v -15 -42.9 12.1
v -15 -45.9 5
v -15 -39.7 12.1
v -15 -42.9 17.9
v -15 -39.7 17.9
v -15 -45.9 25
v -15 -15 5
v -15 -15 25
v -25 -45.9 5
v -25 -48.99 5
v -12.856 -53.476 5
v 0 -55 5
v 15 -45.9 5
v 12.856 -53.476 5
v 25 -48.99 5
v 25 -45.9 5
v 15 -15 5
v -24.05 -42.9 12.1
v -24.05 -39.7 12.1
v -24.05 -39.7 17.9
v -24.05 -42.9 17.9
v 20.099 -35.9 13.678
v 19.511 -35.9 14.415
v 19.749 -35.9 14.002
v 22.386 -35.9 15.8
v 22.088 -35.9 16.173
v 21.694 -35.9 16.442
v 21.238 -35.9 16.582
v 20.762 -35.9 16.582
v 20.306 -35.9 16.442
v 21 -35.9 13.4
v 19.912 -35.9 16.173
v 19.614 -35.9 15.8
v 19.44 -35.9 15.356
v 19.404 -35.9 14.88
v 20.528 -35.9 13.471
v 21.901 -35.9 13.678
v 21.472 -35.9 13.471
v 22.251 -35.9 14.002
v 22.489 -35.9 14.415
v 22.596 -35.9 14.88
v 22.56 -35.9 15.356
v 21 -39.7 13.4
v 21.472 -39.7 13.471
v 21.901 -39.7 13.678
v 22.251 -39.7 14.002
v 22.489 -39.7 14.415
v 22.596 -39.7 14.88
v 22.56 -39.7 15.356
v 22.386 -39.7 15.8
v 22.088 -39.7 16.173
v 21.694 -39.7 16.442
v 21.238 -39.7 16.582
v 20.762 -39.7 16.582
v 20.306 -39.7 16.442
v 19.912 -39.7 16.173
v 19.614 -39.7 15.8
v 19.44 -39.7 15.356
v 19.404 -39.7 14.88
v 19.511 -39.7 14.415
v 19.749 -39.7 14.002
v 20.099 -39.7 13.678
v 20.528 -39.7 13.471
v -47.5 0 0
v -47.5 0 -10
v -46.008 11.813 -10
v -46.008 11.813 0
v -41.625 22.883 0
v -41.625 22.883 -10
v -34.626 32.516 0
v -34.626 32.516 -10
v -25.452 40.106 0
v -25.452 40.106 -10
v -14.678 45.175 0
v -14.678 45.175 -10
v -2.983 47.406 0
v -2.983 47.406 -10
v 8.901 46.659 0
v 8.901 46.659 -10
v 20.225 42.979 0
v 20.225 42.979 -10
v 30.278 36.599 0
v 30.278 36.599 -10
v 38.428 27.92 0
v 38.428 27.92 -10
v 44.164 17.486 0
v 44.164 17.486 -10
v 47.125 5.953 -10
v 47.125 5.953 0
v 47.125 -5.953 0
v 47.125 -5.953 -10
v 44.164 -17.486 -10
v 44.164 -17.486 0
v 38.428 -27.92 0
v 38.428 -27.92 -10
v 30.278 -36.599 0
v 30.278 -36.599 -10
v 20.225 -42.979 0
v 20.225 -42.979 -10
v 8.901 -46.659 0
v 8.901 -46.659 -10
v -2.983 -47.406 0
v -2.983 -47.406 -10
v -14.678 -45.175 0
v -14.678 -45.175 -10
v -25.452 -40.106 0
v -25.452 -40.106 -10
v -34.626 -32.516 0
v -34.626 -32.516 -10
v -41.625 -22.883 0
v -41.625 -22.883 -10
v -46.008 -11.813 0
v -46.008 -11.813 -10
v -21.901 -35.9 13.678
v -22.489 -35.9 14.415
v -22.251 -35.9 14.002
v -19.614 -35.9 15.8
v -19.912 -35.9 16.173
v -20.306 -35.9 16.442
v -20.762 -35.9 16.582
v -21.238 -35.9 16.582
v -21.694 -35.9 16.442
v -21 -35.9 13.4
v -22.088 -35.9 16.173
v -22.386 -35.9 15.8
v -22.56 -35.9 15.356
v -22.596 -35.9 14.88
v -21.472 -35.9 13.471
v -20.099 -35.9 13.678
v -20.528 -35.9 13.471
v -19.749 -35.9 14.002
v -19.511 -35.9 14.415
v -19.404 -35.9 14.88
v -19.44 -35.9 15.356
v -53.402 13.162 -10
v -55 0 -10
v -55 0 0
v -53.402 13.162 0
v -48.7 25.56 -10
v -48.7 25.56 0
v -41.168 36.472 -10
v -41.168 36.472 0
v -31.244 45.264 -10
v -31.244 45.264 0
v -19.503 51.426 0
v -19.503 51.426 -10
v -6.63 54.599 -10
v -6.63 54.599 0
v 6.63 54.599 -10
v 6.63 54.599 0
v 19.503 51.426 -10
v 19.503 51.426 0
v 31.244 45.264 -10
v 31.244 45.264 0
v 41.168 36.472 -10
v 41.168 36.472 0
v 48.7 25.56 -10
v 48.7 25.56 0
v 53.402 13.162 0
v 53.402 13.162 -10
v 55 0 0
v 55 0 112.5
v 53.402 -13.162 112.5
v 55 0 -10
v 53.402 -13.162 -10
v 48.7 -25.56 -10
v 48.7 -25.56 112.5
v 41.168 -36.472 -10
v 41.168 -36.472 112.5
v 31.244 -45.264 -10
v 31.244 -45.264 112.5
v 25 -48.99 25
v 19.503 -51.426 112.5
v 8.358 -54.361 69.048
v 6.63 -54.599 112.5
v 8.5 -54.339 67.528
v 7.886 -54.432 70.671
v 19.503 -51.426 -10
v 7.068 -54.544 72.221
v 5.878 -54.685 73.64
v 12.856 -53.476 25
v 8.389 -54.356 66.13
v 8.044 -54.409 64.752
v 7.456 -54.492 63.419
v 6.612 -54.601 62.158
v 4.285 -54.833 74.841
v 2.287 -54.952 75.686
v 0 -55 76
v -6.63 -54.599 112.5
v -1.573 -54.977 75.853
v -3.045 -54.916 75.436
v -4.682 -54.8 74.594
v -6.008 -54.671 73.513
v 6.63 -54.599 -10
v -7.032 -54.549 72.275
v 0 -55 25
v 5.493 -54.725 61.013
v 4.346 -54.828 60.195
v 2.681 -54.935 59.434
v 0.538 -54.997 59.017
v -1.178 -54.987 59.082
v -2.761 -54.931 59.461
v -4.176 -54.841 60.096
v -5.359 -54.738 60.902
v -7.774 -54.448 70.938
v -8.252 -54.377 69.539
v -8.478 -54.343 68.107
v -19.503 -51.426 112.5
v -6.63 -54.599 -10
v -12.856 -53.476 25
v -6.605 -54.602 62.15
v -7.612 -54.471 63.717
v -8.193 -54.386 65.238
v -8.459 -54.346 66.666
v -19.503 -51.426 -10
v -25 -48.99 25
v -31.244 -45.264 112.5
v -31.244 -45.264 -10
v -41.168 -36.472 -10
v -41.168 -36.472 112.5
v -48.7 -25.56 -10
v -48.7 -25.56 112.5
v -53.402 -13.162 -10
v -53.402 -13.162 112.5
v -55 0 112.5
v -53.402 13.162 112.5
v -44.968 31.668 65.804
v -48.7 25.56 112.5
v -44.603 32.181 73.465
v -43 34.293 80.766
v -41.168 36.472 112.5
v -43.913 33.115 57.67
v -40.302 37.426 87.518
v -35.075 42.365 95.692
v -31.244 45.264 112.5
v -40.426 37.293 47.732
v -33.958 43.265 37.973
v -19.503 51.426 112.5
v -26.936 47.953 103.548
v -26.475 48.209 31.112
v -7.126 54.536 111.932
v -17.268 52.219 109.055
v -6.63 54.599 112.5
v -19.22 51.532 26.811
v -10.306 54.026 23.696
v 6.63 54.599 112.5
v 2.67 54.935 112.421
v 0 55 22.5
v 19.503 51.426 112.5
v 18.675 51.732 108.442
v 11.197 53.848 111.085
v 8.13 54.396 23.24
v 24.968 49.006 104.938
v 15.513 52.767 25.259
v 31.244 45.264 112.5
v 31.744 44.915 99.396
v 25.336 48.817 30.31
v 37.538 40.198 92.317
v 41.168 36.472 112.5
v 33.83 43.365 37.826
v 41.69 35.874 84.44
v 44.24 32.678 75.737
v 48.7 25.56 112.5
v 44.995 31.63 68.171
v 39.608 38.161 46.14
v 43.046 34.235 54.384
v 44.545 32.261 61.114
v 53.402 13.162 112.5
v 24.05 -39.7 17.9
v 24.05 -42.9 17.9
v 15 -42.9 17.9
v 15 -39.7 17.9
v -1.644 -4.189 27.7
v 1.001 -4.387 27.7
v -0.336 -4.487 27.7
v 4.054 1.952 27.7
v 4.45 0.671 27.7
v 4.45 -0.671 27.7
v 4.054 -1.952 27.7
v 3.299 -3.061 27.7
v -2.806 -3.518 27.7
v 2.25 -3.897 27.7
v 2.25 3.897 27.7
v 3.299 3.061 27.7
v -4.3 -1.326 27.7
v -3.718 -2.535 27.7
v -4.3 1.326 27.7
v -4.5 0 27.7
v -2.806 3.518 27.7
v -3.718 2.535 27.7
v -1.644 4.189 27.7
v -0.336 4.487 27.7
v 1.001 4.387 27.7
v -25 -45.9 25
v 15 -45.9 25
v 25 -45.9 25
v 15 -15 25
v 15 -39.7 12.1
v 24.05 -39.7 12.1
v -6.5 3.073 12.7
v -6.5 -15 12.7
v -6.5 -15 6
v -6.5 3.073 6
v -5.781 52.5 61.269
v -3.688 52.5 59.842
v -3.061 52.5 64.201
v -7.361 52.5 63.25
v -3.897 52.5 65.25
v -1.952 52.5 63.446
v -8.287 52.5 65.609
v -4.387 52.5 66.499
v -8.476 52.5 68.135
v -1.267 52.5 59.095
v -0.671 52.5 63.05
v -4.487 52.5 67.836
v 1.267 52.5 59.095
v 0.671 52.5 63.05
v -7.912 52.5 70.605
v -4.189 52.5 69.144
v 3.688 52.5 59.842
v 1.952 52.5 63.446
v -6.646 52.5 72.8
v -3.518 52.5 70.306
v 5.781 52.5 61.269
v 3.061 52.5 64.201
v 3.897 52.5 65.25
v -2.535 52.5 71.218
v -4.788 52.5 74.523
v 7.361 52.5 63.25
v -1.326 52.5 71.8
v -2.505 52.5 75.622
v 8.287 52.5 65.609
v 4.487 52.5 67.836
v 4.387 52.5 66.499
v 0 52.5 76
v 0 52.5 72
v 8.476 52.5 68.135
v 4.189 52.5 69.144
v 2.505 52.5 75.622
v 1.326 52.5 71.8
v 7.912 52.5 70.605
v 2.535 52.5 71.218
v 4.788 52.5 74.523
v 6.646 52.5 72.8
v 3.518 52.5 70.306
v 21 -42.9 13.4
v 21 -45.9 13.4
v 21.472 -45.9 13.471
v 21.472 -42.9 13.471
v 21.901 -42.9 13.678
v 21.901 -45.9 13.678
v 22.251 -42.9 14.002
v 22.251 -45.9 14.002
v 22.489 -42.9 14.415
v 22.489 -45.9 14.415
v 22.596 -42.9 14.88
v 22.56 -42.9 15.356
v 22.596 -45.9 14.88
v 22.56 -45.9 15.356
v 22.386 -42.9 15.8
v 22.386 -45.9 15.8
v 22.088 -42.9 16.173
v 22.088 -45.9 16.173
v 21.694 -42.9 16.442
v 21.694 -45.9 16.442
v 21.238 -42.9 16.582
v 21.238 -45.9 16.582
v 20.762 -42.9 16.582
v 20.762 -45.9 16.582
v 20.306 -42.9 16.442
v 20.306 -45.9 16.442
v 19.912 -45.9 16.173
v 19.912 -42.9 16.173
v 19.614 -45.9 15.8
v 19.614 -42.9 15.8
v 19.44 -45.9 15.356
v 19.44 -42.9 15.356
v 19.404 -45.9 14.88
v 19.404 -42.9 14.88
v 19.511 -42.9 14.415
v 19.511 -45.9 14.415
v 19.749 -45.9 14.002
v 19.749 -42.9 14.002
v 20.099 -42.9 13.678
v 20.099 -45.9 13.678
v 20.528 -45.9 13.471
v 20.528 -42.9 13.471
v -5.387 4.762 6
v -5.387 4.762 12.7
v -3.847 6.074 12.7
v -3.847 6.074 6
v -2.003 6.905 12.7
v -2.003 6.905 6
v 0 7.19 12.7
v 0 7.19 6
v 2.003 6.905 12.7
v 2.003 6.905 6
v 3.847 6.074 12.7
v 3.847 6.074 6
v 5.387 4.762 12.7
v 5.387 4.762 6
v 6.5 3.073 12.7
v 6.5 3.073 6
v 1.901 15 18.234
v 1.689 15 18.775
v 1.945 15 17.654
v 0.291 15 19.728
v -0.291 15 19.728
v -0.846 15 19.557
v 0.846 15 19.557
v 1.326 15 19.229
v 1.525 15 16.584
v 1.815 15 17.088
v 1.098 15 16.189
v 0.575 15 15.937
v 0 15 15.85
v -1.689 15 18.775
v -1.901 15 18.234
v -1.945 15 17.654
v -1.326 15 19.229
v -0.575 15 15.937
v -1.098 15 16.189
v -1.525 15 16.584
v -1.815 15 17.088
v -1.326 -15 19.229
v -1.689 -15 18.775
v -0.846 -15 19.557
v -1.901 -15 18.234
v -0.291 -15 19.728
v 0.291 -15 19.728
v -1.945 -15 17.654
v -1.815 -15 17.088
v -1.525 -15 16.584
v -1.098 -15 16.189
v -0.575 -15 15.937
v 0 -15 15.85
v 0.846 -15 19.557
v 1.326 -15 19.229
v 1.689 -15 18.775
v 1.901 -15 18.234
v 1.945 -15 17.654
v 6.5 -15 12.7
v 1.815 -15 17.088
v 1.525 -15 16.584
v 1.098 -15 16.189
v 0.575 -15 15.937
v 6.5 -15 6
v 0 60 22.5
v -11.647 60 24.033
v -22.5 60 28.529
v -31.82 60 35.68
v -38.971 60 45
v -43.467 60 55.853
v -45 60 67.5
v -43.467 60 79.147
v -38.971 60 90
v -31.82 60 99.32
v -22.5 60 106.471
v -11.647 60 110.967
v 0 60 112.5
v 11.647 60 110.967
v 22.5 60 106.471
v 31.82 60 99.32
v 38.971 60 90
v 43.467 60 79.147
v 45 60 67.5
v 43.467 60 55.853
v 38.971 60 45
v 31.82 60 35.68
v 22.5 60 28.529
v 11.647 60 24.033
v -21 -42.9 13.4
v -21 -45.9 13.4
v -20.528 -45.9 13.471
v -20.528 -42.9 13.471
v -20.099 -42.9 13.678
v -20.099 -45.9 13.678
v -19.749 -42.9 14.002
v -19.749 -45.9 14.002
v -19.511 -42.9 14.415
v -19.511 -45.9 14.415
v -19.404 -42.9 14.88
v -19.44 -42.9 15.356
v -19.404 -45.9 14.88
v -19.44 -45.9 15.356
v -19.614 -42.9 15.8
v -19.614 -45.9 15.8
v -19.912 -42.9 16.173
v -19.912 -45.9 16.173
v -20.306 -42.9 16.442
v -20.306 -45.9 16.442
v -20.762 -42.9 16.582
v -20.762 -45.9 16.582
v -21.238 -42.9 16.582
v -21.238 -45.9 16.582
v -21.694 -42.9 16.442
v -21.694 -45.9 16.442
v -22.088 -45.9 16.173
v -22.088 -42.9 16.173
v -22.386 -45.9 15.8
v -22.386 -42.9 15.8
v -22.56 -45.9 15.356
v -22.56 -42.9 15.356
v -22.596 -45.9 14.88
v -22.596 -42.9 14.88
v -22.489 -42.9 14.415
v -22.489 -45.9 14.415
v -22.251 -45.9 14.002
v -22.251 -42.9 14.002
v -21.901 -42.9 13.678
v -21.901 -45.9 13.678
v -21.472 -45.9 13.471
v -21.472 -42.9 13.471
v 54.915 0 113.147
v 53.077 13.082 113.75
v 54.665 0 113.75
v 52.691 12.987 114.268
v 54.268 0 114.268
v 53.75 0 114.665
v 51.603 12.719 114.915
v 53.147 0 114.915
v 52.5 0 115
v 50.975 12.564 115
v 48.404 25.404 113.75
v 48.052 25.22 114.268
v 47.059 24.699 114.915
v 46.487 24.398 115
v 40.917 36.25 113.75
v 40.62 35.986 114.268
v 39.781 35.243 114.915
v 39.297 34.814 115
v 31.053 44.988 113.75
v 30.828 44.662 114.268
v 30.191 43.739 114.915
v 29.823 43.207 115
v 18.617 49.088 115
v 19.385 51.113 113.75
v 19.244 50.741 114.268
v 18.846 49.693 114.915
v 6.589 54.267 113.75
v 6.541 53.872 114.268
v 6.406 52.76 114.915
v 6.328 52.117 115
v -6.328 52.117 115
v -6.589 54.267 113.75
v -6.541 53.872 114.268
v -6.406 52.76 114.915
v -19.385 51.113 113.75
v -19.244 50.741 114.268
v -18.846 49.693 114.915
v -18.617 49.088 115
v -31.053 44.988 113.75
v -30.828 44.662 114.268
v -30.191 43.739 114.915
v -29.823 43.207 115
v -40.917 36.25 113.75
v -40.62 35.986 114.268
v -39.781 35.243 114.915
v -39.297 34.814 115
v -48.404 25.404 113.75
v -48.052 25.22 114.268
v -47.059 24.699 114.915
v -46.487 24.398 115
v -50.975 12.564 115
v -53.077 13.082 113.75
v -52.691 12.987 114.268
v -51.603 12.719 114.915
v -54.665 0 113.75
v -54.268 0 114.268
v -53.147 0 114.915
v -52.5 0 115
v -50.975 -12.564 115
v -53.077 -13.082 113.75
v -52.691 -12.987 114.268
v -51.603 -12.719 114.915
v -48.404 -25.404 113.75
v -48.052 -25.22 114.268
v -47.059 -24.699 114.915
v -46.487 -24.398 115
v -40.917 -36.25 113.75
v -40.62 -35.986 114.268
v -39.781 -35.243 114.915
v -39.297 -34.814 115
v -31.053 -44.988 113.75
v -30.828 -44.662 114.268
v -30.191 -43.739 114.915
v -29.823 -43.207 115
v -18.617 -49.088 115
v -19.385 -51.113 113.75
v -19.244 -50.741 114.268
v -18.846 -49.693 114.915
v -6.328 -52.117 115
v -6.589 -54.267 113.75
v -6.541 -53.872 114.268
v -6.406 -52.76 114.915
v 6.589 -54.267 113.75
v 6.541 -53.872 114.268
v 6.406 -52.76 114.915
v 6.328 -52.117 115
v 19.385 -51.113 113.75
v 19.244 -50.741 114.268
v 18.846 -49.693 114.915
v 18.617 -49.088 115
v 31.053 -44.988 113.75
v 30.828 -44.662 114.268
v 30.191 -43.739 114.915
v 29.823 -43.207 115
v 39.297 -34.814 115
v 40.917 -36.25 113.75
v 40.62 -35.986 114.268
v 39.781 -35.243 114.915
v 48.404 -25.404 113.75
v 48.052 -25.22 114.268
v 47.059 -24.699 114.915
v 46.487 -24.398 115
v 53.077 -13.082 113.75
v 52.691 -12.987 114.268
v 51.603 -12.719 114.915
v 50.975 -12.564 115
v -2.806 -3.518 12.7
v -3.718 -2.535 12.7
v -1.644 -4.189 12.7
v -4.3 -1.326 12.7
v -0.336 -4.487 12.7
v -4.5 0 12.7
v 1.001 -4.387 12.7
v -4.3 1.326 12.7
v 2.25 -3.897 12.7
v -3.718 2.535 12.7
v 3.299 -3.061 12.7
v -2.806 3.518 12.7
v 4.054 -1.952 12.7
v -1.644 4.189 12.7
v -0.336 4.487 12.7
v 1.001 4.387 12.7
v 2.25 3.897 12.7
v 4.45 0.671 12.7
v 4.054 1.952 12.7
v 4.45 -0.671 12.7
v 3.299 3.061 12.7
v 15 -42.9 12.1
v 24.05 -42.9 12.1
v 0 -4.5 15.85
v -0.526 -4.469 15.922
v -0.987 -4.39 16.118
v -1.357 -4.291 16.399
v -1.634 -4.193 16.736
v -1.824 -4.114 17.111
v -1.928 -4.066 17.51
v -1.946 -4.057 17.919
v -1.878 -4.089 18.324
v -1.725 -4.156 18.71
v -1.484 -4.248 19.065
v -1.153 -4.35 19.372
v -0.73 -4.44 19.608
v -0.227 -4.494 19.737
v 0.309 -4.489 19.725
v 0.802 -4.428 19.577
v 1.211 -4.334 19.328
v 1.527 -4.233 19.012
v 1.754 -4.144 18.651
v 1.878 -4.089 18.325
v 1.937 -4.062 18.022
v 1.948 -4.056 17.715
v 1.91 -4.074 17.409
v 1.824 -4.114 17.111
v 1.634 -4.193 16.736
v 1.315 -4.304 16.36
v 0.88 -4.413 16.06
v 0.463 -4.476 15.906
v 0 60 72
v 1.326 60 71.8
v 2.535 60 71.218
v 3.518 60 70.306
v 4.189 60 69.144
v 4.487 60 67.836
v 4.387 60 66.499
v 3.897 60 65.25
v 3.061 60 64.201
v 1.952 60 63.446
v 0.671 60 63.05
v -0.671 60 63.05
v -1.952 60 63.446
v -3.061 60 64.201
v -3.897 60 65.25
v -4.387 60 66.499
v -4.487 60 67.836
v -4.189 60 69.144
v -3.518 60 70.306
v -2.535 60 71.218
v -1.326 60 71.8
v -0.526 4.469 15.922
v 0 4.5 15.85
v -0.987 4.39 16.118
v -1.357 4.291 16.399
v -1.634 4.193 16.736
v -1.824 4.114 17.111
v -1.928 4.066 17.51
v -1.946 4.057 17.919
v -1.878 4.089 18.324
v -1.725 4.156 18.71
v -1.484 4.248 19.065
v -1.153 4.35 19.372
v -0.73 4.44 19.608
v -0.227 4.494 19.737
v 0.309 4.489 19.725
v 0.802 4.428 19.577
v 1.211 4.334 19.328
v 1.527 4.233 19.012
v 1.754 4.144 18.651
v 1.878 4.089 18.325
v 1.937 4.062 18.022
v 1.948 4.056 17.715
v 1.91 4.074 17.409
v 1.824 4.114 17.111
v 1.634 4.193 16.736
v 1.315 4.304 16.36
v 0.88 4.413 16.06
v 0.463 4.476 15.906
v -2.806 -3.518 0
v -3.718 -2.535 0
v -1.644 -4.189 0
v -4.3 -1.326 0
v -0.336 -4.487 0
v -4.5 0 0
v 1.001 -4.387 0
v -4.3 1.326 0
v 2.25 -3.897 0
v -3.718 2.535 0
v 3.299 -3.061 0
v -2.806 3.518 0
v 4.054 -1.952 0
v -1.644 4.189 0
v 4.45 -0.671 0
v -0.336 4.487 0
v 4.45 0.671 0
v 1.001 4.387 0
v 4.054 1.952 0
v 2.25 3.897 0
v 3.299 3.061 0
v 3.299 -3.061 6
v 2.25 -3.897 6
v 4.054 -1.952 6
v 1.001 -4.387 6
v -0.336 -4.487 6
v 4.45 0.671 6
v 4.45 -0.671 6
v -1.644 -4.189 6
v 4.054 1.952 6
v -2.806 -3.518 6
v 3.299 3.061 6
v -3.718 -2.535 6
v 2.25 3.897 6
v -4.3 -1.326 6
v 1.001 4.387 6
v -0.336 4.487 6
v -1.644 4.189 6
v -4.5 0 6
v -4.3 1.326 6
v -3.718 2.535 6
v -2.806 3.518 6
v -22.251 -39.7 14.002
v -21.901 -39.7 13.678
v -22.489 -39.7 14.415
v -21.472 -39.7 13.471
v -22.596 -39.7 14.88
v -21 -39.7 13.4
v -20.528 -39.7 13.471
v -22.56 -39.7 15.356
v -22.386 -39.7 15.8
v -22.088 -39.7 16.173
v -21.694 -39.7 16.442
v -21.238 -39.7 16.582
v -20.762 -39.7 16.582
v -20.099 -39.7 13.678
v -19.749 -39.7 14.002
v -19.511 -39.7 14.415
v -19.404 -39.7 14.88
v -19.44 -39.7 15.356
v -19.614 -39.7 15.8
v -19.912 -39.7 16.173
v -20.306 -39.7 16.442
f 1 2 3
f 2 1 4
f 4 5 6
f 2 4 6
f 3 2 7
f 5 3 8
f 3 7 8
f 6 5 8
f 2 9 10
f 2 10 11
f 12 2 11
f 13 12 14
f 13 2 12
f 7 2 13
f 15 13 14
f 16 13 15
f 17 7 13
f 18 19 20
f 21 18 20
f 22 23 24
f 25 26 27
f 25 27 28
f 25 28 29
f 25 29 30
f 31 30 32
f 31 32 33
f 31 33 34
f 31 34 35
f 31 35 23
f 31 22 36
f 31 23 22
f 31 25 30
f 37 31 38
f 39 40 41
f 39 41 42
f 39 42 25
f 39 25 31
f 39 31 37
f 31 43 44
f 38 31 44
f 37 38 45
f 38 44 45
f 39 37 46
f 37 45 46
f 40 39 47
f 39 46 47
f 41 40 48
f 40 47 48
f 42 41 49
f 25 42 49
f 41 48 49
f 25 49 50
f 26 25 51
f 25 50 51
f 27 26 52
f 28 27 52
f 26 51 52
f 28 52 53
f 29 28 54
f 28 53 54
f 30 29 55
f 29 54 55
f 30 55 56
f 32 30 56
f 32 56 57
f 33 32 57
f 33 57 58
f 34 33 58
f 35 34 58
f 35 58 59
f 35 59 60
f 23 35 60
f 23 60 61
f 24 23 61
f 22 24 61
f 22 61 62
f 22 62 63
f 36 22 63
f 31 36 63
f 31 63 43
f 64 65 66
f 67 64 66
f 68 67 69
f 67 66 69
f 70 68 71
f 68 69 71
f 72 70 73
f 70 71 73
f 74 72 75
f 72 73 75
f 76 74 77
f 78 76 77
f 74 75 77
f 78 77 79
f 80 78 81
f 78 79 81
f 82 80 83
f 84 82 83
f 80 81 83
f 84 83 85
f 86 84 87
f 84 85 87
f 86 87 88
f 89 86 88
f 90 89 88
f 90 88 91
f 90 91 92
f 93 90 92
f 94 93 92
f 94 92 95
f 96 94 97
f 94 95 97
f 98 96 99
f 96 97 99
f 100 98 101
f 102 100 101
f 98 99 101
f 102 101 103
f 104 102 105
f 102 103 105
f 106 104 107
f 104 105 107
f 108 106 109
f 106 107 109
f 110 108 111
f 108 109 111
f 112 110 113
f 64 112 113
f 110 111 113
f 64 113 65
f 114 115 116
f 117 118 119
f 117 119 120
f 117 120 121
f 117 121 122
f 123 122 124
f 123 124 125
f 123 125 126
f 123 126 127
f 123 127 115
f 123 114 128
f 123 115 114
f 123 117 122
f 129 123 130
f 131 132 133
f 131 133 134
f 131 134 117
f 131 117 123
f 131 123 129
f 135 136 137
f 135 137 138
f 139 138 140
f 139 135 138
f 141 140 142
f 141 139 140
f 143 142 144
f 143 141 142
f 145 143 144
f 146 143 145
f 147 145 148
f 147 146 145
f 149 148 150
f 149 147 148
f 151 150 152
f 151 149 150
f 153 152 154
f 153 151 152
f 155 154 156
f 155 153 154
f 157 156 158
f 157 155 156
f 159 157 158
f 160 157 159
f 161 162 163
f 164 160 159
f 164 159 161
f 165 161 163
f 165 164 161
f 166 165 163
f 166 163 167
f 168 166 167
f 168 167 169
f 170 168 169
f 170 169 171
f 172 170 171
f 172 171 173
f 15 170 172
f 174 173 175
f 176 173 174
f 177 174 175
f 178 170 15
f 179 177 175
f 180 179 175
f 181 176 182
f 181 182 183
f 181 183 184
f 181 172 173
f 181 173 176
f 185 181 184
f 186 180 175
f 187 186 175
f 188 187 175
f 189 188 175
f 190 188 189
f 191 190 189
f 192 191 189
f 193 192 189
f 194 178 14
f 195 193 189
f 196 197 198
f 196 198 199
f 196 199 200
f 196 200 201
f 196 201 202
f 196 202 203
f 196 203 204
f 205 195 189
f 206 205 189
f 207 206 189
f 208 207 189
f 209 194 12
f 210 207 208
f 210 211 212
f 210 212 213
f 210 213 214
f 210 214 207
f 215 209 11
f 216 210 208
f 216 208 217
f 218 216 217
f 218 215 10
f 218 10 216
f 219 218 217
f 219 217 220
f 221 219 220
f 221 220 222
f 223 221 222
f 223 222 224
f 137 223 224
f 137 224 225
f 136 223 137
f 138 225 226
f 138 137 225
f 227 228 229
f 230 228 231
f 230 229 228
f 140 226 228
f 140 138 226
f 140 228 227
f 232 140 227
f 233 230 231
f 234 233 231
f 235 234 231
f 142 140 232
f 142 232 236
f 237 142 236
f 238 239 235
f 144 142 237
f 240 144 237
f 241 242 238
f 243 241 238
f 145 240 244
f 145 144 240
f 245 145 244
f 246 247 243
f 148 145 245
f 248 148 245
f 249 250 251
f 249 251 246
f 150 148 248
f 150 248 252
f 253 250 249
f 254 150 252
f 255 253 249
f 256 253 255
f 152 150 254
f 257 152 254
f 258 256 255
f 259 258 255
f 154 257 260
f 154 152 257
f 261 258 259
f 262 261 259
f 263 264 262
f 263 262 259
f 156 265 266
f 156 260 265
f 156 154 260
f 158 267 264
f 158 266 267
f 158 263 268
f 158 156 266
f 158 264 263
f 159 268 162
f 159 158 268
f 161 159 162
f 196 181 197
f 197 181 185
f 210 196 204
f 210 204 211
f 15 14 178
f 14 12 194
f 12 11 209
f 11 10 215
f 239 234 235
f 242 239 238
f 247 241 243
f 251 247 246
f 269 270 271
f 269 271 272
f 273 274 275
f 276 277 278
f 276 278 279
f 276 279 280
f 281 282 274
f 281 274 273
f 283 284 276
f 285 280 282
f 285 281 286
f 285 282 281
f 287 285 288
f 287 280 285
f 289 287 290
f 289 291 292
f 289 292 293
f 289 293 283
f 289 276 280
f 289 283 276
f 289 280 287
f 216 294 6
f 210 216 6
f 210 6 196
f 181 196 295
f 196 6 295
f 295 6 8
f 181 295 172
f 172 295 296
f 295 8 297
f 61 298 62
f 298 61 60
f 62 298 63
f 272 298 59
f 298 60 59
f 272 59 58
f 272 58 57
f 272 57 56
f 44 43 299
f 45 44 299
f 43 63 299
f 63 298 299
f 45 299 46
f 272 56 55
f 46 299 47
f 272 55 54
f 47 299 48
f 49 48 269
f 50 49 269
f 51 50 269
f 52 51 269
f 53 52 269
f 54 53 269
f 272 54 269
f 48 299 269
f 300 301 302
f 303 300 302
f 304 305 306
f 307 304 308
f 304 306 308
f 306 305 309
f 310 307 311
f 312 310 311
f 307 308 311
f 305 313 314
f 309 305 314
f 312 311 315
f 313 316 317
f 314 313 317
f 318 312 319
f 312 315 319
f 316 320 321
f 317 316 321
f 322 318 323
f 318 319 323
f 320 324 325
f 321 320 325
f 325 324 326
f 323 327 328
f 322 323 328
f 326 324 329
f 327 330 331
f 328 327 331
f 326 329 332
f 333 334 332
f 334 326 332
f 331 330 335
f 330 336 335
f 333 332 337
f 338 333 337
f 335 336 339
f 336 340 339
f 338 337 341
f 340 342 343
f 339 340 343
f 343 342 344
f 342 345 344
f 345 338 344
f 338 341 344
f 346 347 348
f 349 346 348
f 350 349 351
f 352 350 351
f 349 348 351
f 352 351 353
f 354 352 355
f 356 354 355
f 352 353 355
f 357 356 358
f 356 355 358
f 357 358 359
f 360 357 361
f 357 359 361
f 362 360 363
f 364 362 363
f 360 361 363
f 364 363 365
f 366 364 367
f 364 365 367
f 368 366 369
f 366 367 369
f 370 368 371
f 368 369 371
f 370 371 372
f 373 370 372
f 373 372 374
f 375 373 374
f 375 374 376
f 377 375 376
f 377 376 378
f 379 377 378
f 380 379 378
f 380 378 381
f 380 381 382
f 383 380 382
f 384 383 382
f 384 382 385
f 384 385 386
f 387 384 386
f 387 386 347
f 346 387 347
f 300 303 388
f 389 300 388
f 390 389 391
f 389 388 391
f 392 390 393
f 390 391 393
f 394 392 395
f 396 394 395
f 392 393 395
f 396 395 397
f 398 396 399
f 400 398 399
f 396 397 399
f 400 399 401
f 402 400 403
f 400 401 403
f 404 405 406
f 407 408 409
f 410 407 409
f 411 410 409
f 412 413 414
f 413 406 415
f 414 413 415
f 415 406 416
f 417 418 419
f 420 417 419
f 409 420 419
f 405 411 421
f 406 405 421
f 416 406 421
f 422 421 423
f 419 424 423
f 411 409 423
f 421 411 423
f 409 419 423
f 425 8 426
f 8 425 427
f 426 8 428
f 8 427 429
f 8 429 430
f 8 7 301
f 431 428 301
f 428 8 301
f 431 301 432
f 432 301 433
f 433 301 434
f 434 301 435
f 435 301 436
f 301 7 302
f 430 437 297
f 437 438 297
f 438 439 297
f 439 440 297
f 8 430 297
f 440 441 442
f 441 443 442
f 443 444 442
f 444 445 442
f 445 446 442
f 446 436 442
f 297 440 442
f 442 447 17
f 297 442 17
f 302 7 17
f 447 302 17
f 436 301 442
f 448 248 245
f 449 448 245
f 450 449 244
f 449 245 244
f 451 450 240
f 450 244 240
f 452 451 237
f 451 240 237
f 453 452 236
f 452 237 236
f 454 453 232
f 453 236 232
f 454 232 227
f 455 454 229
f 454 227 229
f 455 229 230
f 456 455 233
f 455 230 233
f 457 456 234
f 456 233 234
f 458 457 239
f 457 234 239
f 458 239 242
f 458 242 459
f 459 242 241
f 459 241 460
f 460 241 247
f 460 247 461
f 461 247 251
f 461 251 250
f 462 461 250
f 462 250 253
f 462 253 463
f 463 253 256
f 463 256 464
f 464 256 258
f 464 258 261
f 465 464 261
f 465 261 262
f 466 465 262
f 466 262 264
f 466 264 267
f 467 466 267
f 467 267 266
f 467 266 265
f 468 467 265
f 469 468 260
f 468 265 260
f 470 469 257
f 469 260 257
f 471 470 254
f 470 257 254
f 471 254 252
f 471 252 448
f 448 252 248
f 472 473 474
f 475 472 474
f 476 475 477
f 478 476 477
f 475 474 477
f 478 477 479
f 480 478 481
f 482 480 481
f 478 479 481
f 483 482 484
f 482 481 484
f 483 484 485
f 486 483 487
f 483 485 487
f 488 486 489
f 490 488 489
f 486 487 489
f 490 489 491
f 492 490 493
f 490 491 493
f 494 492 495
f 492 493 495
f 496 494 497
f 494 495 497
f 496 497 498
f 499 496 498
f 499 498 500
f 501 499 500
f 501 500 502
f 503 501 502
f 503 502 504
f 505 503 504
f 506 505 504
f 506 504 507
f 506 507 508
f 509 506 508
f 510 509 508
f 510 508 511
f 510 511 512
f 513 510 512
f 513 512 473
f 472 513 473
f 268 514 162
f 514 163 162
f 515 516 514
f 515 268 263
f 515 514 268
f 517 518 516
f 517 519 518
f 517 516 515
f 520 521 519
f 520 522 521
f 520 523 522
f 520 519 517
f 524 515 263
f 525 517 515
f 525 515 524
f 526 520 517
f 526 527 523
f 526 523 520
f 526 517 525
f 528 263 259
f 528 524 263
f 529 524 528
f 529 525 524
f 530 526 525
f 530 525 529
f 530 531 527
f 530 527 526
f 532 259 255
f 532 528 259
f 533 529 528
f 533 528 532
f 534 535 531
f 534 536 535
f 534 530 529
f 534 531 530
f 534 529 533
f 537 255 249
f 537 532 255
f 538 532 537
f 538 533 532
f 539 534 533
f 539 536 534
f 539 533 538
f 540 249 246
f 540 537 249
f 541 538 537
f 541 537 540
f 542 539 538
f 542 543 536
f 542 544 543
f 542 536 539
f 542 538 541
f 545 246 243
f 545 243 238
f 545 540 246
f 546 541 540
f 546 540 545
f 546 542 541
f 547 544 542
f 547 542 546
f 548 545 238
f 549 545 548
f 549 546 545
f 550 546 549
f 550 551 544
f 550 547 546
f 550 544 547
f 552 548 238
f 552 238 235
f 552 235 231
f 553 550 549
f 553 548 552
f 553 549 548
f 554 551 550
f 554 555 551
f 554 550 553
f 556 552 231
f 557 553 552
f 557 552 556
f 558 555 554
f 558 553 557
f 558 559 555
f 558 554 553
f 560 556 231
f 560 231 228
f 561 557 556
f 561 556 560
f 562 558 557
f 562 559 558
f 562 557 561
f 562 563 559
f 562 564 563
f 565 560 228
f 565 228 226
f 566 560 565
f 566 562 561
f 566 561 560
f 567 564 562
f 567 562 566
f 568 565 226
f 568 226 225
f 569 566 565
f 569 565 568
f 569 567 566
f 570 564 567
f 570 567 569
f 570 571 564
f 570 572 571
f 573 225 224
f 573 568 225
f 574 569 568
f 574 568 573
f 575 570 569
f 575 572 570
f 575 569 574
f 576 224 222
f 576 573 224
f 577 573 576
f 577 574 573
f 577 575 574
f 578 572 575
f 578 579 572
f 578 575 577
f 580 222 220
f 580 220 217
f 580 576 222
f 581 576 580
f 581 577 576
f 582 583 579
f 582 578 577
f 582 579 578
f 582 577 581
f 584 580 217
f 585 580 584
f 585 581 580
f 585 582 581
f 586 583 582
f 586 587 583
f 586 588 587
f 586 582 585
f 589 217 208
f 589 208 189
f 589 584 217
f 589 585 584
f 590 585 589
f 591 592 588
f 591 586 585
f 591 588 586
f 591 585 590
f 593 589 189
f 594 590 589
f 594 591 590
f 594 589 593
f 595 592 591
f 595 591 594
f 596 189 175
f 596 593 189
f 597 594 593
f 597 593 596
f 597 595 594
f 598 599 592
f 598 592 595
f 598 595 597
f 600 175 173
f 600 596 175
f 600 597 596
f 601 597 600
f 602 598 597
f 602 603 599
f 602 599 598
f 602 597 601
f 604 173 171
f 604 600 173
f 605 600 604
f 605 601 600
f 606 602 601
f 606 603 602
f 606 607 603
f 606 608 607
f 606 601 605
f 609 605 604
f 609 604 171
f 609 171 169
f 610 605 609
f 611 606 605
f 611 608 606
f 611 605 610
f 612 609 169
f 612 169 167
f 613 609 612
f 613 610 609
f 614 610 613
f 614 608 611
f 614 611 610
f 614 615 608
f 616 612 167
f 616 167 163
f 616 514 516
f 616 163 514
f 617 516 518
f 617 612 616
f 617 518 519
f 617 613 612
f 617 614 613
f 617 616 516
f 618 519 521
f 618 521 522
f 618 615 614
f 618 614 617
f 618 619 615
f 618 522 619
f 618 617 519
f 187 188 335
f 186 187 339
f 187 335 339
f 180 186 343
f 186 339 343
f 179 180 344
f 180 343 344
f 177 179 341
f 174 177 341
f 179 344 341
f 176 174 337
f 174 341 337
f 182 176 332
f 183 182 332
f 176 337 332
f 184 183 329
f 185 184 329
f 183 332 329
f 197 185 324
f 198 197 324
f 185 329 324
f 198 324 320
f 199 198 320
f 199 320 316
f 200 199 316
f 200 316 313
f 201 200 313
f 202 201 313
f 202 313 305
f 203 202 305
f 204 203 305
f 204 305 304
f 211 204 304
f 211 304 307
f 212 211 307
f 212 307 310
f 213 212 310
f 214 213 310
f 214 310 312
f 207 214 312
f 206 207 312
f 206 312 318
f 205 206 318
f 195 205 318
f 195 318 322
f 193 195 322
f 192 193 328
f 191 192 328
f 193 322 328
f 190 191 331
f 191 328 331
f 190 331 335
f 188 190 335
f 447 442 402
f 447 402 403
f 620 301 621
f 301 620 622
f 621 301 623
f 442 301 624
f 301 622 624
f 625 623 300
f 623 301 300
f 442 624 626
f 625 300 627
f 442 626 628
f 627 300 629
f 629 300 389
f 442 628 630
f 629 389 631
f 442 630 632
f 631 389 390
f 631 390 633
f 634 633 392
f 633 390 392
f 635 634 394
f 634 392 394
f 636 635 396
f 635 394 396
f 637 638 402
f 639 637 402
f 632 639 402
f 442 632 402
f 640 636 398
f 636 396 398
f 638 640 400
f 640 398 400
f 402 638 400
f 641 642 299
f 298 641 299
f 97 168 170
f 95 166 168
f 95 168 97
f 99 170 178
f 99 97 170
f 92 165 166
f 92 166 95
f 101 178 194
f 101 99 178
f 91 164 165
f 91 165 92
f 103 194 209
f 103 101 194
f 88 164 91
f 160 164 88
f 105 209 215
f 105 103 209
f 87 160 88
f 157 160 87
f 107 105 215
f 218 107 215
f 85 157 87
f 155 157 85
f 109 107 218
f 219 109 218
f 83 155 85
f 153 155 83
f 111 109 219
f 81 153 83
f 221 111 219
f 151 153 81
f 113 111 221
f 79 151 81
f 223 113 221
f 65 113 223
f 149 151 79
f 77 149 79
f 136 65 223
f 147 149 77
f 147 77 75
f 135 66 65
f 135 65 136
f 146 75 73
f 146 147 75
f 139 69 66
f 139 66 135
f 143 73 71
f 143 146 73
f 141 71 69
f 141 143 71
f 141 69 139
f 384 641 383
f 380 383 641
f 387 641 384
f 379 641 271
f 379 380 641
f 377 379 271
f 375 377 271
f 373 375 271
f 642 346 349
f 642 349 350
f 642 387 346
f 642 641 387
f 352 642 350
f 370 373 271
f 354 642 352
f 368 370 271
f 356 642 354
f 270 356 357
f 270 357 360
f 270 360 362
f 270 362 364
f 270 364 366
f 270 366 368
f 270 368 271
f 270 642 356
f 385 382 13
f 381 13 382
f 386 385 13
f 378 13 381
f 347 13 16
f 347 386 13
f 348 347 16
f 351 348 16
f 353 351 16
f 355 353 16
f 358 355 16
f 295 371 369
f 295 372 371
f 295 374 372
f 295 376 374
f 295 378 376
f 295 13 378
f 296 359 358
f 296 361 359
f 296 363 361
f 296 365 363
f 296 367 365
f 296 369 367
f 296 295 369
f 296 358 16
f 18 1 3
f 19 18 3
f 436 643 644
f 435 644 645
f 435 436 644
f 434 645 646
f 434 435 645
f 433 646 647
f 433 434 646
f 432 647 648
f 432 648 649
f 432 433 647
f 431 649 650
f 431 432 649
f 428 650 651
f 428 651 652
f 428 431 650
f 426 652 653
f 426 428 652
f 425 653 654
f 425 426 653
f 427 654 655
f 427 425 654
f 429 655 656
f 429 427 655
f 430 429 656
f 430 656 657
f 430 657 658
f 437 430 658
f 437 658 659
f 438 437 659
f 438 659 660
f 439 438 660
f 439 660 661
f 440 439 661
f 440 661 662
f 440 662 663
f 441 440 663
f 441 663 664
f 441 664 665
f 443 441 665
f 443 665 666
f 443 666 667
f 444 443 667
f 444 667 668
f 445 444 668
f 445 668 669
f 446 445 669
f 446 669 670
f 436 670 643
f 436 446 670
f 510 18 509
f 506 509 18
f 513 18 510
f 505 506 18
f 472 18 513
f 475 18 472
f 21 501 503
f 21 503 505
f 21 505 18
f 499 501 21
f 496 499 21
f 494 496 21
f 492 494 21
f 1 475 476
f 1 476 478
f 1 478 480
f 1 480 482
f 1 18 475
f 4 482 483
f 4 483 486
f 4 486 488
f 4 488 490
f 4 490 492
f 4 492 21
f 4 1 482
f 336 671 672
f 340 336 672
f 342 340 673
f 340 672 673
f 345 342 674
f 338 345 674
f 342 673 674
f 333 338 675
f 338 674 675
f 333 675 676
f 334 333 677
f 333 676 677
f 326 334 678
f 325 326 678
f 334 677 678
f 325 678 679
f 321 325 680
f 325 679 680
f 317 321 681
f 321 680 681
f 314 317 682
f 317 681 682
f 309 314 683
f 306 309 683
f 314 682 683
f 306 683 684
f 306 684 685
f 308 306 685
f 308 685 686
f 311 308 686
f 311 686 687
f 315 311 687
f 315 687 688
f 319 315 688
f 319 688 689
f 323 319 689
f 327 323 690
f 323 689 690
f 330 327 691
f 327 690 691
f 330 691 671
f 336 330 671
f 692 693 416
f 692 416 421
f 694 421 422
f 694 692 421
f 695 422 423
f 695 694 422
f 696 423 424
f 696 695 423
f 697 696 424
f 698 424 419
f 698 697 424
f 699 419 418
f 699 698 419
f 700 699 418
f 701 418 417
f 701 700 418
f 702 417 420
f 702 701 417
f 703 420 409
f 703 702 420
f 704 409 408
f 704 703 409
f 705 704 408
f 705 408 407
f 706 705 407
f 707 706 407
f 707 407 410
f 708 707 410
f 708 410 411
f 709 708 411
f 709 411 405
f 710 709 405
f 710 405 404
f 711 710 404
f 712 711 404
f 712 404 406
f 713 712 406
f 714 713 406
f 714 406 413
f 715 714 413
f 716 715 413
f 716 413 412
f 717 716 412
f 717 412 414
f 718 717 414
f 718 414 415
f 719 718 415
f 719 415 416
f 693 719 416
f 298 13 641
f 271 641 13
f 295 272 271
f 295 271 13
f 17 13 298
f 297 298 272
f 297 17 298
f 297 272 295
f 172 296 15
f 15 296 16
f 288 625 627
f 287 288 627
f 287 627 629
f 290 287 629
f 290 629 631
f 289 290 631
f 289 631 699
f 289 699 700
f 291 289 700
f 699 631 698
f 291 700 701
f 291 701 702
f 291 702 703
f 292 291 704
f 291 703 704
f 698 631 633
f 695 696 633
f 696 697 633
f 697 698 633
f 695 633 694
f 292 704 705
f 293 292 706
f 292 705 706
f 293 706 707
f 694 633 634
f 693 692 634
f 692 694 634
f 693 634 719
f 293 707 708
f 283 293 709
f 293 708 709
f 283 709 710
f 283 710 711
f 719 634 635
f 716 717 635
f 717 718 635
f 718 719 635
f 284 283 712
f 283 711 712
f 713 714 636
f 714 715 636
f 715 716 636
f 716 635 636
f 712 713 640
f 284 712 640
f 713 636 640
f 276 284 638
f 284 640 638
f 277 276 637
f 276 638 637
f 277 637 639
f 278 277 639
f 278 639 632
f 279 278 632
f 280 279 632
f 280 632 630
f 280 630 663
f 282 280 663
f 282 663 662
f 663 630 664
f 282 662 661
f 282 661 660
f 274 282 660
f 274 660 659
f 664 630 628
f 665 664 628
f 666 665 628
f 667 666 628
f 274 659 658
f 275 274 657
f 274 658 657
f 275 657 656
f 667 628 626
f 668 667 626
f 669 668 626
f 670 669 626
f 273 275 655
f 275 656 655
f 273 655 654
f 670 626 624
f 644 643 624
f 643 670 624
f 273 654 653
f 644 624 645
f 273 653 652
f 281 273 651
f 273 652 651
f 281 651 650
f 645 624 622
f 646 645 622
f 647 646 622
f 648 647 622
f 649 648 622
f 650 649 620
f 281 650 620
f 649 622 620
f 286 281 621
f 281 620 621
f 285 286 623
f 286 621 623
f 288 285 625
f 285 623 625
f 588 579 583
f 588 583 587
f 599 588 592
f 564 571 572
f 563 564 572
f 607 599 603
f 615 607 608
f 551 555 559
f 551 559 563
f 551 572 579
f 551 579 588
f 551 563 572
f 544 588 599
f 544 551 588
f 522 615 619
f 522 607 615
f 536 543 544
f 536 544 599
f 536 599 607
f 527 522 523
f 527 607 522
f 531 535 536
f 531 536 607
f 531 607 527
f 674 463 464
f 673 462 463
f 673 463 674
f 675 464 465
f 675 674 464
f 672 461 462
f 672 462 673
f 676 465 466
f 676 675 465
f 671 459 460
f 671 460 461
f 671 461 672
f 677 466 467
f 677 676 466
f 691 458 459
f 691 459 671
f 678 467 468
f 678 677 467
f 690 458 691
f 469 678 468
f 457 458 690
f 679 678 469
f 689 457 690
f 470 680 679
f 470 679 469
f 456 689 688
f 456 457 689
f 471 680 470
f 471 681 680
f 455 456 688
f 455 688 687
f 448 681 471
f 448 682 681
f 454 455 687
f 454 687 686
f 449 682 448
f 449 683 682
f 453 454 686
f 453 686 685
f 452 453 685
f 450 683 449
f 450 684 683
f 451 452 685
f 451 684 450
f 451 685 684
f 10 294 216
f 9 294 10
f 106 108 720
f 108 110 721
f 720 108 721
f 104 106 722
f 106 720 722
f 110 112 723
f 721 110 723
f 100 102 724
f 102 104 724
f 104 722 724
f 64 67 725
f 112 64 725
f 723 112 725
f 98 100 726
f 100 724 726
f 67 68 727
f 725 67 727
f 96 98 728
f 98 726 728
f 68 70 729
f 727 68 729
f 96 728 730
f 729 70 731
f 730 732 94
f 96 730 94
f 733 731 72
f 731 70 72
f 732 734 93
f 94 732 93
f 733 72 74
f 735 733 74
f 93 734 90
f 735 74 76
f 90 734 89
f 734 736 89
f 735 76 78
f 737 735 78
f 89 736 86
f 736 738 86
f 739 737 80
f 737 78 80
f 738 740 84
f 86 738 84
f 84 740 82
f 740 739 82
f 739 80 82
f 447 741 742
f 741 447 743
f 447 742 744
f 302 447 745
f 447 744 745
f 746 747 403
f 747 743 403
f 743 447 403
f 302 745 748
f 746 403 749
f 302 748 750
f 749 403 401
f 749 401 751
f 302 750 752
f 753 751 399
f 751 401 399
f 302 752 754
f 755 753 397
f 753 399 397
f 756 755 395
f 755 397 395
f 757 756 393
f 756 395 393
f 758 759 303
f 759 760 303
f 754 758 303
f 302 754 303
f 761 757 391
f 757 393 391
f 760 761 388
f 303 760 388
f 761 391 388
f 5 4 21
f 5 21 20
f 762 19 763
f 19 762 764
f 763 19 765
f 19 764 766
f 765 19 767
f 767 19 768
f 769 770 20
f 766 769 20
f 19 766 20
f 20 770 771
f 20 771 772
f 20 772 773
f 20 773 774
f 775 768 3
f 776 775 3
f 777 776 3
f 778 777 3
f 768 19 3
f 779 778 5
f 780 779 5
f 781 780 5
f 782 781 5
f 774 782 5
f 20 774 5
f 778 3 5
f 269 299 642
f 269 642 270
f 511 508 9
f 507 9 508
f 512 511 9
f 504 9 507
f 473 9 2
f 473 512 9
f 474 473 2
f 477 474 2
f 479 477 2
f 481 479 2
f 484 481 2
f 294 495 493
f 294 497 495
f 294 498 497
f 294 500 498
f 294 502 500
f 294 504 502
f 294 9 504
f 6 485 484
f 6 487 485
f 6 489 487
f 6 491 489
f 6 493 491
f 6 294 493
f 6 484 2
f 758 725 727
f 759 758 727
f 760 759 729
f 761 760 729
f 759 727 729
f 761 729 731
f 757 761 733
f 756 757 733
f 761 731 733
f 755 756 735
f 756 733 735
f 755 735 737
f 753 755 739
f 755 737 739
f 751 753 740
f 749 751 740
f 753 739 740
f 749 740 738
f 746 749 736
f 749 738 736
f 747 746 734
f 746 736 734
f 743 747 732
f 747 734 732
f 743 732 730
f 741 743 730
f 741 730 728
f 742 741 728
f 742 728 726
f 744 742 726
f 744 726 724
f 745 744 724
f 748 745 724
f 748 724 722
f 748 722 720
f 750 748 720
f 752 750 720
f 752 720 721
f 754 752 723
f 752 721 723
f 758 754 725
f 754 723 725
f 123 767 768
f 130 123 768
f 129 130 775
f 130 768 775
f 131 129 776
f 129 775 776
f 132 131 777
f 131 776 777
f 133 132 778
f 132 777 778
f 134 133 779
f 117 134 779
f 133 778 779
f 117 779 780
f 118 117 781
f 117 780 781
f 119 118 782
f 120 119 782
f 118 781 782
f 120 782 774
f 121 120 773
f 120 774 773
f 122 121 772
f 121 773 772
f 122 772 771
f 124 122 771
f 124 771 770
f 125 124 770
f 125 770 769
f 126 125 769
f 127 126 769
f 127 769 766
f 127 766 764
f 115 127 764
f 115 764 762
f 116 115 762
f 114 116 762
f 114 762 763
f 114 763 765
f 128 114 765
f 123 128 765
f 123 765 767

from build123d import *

# Parameters (mm, degrees)
ESBO_O1_R                   = 55
RESSALTO_EXTRUS_O1_DEPTH    = 115
ESBO_O2_R                   = 45
RESSALTO_EXTRUS_O2_DEPTH    = 60
ESBO_O3_R                   = 4.5
CORTE_EXTRUS_O1_DEPTH       = 6
FILETE1_R                   = 2.5
ESBO_O10_R                  = 4.5
CORTE_EXTRUS_O7_DEPTH       = 7.5
CORTE_EXTRUS_O8_REACH       = 168.752
CORTE_EXTRUS_O8_END_RADIUS  = 55
ESBO_O11_R                  = 8.5
CORTE_EXTRUS_O12_DEPTH      = 6.7
ESBO_O17_R                  = 4.5
CORTE_EXTRUS_O13_DEPTH      = 15
CORTE_EXTRUS_O14_DEPTH      = 15
CORTE_EXTRUS_O14_DEPTH_BACK = 15
ESBO_O18_R                  = 1.95
ESBO_O19_W                  = 50
ESBO_O19_H                  = 20
CORTE_EXTRUS_O15_DEPTH      = 53
CORTE_EXTRUS_O16_REACH      = 146.099
ESBO_O20_W                  = 13
ESBO_O20_H                  = 6.7
ESBO_O21_W                  = 10
ESBO_O21_H                  = 20
RESSALTO_EXTRUS_O4_DEPTH    = 30.9
CORTE_EXTRUS_O17_DEPTH      = 39.05
CORTE_EXTRUS_O17_DEPTH_BACK = 9.05
ESBO_O22_W                  = 5.8
ESBO_O22_H                  = 3.2
ESBO_O23_R                  = 1.6
CORTE_EXTRUS_O18_DEPTH      = 10
RESSALTO_EXTRUS_O5_START    = 10
ESBO_O24_R                  = 55
ESBO_O24_R_2                = 47.5
RESSALTO_EXTRUS_O5_DEPTH    = 10


with BuildPart() as part:
    # Esboço1 → Ressalto-extrusão1 (new body)
    with BuildSketch(Plane.XY):
        Circle(ESBO_O1_R)
    extrude(amount=RESSALTO_EXTRUS_O1_DEPTH)

    # Esboço2 → Ressalto-extrusão2 (add)
    with BuildSketch(Plane(origin=(0, 0, 0), x_dir=(1, 0, 0), z_dir=(0, 1, 0))):
        with Locations(Location((0, -67.5, 0), (0, 0, 90))):
            Circle(ESBO_O2_R)
    extrude(amount=RESSALTO_EXTRUS_O2_DEPTH)

    # Esboço3 → Corte-extrusão1 (cut)
    with BuildSketch(Plane(origin=(0, 0, 0), x_dir=(-1, 0, 0), z_dir=(0, 0, -1))):
        Circle(ESBO_O3_R)
    extrude(amount=-CORTE_EXTRUS_O1_DEPTH, mode=Mode.SUBTRACT)

    # Filete1
    filete1_edges = [part.edges().sort_by_distance(p)[0] for p in [
        (-55, 0, 115),
    ]]
    fillet(filete1_edges, radius=FILETE1_R - 0.0001)  # a hair under: the kernel refuses the full size

    # Esboço10 → Corte-extrusão7 (cut)
    with BuildSketch(Plane(origin=(0, 60, 0), x_dir=(1, 0, 0), z_dir=(0, 1, 0))):
        with Locations(Location((0, -67.5, 0), (0, 0, 270))):
            Circle(ESBO_O10_R)
    extrude(amount=-CORTE_EXTRUS_O7_DEPTH, mode=Mode.SUBTRACT)

    # Corte-extrusão8: up to this cylinder (the profile starts inside it)
    corte_extrus_o8_end = Plane(origin=(0, 0, 67.5), z_dir=(0, 0, -1)) * Cylinder(CORTE_EXTRUS_O8_END_RADIUS, 448.504, mode=Mode.PRIVATE)
    # Esboço11 → Corte-extrusão8 (cut, up to the surface)
    with BuildSketch(Plane(origin=(0, 52.5, 0), x_dir=(1, 0, 0), z_dir=(0, 1, 0)), mode=Mode.PRIVATE) as corte_extrus_o8_sk1:
        with Locations(Location((0, -67.5, 0), (0, 0, 270))):
            Circle(ESBO_O11_R)
    corte_extrus_o8_tool1 = extrude(corte_extrus_o8_sk1.sketch, amount=-CORTE_EXTRUS_O8_REACH, mode=Mode.PRIVATE) & corte_extrus_o8_end
    add(corte_extrus_o8_tool1.solids().sort_by_distance((0, 52.5, 67.5))[0], mode=Mode.SUBTRACT)

    # Esboço16 → Corte-extrusão12 (cut)
    with BuildSketch(Plane(origin=(0, 0, 6), x_dir=(-1, 0, 0), z_dir=(0, 0, -1))):
        with BuildLine():
            Line((-6.5, 3.073450829), (-6.5, -7.19))
            Line((-6.5, -7.19), (6.5, -7.19))
            Line((6.5, -7.19), (6.5, 3.073450829))
            ThreePointArc((6.5, 3.073450829), (0, 7.19), (-6.5, 3.073450829))
        make_face()
    extrude(amount=-CORTE_EXTRUS_O12_DEPTH, mode=Mode.SUBTRACT)

    # Esboço17 → Corte-extrusão13 (cut)
    with BuildSketch(Plane(origin=(0, 0, 12.7), x_dir=(-1, 0, 0), z_dir=(0, 0, -1))):
        Circle(ESBO_O17_R)
    extrude(amount=-CORTE_EXTRUS_O13_DEPTH, mode=Mode.SUBTRACT)

    # Esboço18 → Corte-extrusão14 (cut, two sides: drawn at the far end of the back side and taken through both)
    with BuildSketch(Plane(origin=(0, 0, 0), x_dir=(1, 0, 0), z_dir=(0, 1, 0)).offset(-CORTE_EXTRUS_O14_DEPTH_BACK)):
        with Locations(Location((0, -17.8, 0), (0, 0, 90))):
            Circle(ESBO_O18_R)
    extrude(amount=CORTE_EXTRUS_O14_DEPTH + CORTE_EXTRUS_O14_DEPTH_BACK, mode=Mode.SUBTRACT)

    # Esboço19 → Corte-extrusão15 (cut)
    with BuildSketch(Plane(origin=(0, -15, 0), x_dir=(1, 0, 0), z_dir=(0, 1, 0))):
        with Locations((0, -15)):
            Rectangle(ESBO_O19_W, ESBO_O19_H)
    extrude(amount=-CORTE_EXTRUS_O15_DEPTH, mode=Mode.SUBTRACT)

    # Esboço20 → Corte-extrusão16 (cut, up to next)
    with BuildSketch(Plane(origin=(0, -7.19, 0), x_dir=(1, 0, 0), z_dir=(0, 1, 0)), mode=Mode.PRIVATE) as corte_extrus_o16_sk1:
        with Locations((0, -9.35)):
            Rectangle(ESBO_O20_W, ESBO_O20_H)
    corte_extrus_o16_tool1 = extrude(corte_extrus_o16_sk1.sketch, amount=-CORTE_EXTRUS_O16_REACH, mode=Mode.PRIVATE) & part.part
    add(corte_extrus_o16_tool1.solids().sort_by_distance((0, -7.19, 9.35))[0], mode=Mode.SUBTRACT)

    # Esboço21 → Ressalto-extrusão4 (add)
    with BuildSketch(Plane.XZ.offset(15)):
        with Locations((20, 15)):
            Rectangle(ESBO_O21_W, ESBO_O21_H)
        with Locations((-20, 15)):
            Rectangle(ESBO_O21_W, ESBO_O21_H)
    extrude(amount=RESSALTO_EXTRUS_O4_DEPTH)

    # Esboço22 → Corte-extrusão17 (cut, two sides: drawn at the far end of the back side and taken through both)
    with BuildSketch(Plane.ZY.offset(-15).offset(-CORTE_EXTRUS_O17_DEPTH_BACK)):
        with Locations((15, -41.3)):
            Rectangle(ESBO_O22_W, ESBO_O22_H)
    extrude(amount=CORTE_EXTRUS_O17_DEPTH + CORTE_EXTRUS_O17_DEPTH_BACK, mode=Mode.SUBTRACT)

    # Esboço23 → Corte-extrusão18 (cut)
    with BuildSketch(Plane.XZ.offset(45.9)):
        with Locations(Location((21, 15, 0), (0, 0, 270))):
            Circle(ESBO_O23_R)
        with Locations(Location((-21, 15, 0), (0, 0, 270))):
            Circle(ESBO_O23_R)
    extrude(amount=-CORTE_EXTRUS_O18_DEPTH, mode=Mode.SUBTRACT)

    # Esboço24 → Ressalto-extrusão5 (add)
    with BuildSketch(Plane(origin=(0, 0, 0), x_dir=(-1, 0, 0), z_dir=(0, 0, -1)).offset(RESSALTO_EXTRUS_O5_START)):
        Circle(ESBO_O24_R)
        Circle(ESBO_O24_R_2, mode=Mode.SUBTRACT)
    extrude(amount=-RESSALTO_EXTRUS_O5_DEPTH)


solid = part.part
